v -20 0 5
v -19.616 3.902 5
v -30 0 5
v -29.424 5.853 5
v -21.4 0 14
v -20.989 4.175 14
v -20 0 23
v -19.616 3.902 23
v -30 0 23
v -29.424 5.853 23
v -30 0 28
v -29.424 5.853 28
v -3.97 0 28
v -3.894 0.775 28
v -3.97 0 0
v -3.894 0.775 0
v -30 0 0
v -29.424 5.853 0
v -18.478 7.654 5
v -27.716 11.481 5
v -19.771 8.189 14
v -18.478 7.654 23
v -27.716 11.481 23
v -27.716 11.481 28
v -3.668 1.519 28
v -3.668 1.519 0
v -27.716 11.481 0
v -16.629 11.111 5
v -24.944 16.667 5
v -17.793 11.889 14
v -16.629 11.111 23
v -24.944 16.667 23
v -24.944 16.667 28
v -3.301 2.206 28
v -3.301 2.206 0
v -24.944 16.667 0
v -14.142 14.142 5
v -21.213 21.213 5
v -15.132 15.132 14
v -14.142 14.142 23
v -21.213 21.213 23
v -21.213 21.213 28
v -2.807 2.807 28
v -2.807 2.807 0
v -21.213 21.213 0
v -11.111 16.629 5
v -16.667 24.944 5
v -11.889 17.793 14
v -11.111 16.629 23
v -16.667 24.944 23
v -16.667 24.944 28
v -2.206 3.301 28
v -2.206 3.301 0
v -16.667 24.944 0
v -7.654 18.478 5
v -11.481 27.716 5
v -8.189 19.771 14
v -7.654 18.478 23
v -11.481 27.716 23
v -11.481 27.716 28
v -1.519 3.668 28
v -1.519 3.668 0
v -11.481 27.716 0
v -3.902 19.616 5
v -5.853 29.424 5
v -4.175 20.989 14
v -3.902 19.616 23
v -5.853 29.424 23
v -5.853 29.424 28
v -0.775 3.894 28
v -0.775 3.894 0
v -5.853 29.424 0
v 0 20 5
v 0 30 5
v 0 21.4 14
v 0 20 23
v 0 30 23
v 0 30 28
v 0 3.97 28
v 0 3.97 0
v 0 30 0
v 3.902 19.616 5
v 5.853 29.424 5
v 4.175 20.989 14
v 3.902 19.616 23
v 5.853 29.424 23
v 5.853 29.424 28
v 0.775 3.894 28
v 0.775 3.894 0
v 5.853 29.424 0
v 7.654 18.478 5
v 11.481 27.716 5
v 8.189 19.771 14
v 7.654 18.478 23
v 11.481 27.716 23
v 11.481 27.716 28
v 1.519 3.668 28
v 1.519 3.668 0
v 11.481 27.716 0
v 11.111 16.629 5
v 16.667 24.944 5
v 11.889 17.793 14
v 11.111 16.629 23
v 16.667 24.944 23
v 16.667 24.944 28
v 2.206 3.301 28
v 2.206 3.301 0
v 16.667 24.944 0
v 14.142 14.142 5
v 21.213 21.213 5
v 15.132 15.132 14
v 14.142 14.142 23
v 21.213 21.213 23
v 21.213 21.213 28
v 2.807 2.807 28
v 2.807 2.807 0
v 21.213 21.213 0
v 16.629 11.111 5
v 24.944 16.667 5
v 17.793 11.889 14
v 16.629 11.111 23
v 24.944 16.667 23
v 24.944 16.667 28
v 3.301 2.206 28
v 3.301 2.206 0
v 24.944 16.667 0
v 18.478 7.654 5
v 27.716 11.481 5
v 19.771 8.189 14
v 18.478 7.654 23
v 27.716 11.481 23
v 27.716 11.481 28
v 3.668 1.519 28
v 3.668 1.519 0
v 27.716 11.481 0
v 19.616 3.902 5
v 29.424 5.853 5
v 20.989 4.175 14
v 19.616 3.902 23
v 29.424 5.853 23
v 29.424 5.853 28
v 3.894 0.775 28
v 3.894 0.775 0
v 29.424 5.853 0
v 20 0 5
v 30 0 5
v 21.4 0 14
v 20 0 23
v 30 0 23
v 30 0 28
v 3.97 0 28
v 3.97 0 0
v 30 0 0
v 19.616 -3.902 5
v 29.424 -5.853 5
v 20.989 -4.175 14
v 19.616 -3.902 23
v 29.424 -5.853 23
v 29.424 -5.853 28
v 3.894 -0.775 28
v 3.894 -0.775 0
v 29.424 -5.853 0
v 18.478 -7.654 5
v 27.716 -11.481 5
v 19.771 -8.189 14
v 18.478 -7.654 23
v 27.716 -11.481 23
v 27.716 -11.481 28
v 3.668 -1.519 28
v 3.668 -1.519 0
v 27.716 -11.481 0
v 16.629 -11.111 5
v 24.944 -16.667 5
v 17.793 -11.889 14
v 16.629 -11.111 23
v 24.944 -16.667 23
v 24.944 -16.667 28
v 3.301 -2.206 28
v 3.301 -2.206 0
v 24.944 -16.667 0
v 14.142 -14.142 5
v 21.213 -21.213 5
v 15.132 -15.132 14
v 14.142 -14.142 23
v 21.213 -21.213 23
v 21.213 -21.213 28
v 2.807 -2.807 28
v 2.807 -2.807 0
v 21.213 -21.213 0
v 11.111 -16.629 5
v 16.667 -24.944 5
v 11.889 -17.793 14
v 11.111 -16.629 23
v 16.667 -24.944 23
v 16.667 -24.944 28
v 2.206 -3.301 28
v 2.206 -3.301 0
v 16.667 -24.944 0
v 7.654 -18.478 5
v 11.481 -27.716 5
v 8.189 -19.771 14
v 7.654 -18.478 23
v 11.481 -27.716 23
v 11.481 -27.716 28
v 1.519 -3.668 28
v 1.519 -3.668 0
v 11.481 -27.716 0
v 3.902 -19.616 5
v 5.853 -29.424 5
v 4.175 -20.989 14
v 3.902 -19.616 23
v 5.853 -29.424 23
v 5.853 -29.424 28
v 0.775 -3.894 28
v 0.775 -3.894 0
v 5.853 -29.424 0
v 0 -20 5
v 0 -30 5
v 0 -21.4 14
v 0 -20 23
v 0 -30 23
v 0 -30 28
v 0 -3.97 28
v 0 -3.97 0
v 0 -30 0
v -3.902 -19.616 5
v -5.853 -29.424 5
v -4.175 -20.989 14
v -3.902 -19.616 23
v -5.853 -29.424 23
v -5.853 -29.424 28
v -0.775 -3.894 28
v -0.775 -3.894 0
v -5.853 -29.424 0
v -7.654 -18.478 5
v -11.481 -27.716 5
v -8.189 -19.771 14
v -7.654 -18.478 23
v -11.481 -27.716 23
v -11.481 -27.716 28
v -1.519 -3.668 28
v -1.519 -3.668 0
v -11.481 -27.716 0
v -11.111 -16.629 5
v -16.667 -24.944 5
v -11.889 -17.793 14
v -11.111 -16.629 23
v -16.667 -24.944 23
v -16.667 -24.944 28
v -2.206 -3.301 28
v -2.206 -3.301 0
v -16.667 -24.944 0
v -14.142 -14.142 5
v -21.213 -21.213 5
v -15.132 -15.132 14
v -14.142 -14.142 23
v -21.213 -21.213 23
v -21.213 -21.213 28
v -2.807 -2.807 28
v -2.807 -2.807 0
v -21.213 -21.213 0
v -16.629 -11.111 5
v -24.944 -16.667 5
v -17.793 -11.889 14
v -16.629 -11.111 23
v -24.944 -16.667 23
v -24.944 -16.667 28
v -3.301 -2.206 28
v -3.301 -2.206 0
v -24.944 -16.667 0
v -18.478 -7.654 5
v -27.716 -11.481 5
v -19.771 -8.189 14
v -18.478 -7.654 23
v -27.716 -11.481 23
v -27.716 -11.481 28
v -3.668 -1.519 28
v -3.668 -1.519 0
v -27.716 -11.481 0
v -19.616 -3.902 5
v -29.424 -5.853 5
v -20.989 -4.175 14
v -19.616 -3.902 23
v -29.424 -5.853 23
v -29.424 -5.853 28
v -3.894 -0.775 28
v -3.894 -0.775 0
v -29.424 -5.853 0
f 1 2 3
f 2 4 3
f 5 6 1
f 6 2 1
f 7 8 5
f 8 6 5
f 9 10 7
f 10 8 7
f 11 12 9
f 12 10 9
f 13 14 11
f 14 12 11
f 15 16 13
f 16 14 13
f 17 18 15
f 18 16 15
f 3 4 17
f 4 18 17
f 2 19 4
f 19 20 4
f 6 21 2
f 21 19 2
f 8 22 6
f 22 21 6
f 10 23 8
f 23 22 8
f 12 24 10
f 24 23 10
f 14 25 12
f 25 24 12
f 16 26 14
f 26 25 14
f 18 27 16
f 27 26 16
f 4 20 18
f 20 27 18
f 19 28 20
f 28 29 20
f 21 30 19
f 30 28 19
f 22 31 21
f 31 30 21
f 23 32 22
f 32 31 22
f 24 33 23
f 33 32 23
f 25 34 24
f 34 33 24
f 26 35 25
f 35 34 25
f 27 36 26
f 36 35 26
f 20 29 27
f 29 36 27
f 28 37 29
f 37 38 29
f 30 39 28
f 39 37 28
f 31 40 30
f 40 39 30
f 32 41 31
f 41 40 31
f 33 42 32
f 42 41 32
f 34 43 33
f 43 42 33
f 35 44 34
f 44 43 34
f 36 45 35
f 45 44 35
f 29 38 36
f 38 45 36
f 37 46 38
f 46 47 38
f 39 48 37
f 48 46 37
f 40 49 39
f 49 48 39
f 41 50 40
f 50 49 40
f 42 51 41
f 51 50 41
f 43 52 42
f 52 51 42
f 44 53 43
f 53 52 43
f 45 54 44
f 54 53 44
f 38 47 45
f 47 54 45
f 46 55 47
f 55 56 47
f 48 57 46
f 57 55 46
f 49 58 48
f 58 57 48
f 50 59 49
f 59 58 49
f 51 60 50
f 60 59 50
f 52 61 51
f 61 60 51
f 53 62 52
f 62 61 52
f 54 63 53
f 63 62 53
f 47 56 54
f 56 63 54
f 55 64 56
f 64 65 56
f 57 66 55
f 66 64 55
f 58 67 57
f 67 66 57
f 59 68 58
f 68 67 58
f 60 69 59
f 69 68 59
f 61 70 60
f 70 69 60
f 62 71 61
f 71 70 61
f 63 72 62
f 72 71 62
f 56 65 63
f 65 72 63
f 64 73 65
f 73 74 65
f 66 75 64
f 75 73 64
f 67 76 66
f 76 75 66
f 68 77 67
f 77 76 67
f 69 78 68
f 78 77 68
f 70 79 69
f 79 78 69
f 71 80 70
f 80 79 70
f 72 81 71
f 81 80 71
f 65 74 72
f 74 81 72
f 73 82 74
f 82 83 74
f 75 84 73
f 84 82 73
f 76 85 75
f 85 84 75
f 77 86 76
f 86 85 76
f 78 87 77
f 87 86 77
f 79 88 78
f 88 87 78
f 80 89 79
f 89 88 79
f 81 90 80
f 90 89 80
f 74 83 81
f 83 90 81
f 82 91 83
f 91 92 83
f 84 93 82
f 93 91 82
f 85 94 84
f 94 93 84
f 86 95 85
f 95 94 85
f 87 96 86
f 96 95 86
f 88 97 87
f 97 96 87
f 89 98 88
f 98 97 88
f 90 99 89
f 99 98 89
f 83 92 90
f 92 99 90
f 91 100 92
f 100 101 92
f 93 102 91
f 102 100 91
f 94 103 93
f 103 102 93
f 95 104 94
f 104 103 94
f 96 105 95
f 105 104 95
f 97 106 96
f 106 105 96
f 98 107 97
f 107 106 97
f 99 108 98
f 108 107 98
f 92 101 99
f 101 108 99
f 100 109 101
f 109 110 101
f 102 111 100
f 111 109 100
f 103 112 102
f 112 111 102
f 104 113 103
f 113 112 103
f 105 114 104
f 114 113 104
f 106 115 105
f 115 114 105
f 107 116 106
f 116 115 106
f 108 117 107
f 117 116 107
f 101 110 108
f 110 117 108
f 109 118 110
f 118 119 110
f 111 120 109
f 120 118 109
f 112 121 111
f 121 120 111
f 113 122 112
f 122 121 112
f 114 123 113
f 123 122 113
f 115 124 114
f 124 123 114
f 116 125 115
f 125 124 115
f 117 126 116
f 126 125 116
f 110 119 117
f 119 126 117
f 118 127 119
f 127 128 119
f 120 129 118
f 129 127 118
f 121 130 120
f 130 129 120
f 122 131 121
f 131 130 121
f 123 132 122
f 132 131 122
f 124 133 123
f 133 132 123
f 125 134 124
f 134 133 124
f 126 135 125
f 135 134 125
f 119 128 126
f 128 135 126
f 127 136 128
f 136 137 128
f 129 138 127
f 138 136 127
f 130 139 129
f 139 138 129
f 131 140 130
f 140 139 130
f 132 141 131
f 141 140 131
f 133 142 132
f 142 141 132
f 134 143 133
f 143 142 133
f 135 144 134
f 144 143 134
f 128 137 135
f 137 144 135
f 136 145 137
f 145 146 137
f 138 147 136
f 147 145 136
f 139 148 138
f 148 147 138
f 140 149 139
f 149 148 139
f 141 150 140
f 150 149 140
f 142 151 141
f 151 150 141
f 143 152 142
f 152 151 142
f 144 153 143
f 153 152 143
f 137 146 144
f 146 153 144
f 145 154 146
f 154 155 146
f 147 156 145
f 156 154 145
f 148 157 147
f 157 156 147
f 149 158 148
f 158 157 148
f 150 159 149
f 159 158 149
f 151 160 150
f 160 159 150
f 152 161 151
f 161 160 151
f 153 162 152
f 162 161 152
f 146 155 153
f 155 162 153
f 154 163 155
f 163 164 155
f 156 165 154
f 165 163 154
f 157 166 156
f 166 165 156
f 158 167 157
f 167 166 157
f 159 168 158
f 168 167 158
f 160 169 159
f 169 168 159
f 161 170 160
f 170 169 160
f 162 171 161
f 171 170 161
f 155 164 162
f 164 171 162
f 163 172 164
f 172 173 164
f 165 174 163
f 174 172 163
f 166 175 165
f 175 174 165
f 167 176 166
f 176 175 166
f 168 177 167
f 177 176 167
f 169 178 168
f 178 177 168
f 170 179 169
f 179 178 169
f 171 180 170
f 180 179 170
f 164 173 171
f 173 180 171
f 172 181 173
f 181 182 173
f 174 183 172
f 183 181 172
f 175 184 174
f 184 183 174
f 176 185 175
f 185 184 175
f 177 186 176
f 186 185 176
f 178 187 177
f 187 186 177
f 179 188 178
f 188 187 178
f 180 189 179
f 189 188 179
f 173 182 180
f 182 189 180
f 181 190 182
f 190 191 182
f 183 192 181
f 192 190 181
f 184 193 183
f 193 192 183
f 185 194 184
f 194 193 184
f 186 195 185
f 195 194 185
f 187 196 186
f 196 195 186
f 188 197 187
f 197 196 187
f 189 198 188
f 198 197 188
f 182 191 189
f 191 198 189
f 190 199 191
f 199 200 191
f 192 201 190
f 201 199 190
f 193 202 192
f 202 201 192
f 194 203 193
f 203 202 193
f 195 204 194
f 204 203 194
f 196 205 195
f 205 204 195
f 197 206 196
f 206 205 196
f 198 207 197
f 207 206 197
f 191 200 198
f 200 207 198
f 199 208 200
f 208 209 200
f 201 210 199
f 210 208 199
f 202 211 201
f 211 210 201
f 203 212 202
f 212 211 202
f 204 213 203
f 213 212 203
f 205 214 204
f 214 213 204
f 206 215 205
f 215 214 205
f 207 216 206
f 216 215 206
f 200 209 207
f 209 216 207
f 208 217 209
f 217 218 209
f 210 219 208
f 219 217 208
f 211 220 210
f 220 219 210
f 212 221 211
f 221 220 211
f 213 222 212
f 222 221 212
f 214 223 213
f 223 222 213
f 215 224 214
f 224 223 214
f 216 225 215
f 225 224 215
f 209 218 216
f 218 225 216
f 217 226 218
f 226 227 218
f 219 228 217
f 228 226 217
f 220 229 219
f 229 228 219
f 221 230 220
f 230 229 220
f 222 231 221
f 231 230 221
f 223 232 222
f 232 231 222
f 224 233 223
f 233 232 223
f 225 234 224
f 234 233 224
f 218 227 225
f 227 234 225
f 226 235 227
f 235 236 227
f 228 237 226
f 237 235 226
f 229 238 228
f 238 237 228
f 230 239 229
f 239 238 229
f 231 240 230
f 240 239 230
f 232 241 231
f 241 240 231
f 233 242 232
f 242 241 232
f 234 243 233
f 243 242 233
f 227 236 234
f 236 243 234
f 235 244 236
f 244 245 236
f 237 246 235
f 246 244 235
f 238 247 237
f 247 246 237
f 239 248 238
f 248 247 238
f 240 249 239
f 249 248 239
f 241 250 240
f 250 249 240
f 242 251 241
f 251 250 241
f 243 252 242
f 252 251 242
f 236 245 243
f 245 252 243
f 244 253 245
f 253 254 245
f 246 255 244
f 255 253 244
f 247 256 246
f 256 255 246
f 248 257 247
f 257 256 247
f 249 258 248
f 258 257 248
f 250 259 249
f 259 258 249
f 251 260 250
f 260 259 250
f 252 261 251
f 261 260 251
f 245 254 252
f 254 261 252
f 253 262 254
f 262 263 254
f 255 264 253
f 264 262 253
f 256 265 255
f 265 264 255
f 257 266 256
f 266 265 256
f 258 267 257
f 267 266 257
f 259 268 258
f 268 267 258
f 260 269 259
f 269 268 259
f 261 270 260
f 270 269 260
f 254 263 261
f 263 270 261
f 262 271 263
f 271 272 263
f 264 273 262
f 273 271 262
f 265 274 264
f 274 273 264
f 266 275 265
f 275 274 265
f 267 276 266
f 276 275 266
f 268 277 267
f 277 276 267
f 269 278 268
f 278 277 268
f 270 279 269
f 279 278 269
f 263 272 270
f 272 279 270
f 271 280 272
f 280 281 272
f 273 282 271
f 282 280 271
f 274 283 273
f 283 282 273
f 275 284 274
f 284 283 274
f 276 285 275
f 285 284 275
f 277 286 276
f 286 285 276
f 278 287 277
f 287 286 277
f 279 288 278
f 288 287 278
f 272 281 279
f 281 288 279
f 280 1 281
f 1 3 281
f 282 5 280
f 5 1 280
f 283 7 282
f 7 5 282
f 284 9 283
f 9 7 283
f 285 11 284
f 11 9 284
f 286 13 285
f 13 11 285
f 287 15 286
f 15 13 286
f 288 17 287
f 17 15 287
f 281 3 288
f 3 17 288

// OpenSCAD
$fn = 32;

// ----------------------------------------------------------------------
// Belt roller: 40 mm barrel, 28 mm wide, bore 7.94 mm
// ----------------------------------------------------------------------

// --- parameters (mm) ---
bore_d = 7.94;            // bore
barrel_d = 40;            // barrel diameter
roller_w = 28;            // roller width
flange_d = 60;            // flange diameter
flange_t = 5;             // flange thickness
hub_d = 27.94;            // hub diameter

roller_profile = [[3.97, 0], [30, 0], [30, 5], [20, 5], [21.4, 14], [20, 23], [30, 23], [30, 28], [3.97, 28]];

/* the profile stays clear of the axis, so the bore comes out of the revolve */
rotate_extrude() polygon(roller_profile);
